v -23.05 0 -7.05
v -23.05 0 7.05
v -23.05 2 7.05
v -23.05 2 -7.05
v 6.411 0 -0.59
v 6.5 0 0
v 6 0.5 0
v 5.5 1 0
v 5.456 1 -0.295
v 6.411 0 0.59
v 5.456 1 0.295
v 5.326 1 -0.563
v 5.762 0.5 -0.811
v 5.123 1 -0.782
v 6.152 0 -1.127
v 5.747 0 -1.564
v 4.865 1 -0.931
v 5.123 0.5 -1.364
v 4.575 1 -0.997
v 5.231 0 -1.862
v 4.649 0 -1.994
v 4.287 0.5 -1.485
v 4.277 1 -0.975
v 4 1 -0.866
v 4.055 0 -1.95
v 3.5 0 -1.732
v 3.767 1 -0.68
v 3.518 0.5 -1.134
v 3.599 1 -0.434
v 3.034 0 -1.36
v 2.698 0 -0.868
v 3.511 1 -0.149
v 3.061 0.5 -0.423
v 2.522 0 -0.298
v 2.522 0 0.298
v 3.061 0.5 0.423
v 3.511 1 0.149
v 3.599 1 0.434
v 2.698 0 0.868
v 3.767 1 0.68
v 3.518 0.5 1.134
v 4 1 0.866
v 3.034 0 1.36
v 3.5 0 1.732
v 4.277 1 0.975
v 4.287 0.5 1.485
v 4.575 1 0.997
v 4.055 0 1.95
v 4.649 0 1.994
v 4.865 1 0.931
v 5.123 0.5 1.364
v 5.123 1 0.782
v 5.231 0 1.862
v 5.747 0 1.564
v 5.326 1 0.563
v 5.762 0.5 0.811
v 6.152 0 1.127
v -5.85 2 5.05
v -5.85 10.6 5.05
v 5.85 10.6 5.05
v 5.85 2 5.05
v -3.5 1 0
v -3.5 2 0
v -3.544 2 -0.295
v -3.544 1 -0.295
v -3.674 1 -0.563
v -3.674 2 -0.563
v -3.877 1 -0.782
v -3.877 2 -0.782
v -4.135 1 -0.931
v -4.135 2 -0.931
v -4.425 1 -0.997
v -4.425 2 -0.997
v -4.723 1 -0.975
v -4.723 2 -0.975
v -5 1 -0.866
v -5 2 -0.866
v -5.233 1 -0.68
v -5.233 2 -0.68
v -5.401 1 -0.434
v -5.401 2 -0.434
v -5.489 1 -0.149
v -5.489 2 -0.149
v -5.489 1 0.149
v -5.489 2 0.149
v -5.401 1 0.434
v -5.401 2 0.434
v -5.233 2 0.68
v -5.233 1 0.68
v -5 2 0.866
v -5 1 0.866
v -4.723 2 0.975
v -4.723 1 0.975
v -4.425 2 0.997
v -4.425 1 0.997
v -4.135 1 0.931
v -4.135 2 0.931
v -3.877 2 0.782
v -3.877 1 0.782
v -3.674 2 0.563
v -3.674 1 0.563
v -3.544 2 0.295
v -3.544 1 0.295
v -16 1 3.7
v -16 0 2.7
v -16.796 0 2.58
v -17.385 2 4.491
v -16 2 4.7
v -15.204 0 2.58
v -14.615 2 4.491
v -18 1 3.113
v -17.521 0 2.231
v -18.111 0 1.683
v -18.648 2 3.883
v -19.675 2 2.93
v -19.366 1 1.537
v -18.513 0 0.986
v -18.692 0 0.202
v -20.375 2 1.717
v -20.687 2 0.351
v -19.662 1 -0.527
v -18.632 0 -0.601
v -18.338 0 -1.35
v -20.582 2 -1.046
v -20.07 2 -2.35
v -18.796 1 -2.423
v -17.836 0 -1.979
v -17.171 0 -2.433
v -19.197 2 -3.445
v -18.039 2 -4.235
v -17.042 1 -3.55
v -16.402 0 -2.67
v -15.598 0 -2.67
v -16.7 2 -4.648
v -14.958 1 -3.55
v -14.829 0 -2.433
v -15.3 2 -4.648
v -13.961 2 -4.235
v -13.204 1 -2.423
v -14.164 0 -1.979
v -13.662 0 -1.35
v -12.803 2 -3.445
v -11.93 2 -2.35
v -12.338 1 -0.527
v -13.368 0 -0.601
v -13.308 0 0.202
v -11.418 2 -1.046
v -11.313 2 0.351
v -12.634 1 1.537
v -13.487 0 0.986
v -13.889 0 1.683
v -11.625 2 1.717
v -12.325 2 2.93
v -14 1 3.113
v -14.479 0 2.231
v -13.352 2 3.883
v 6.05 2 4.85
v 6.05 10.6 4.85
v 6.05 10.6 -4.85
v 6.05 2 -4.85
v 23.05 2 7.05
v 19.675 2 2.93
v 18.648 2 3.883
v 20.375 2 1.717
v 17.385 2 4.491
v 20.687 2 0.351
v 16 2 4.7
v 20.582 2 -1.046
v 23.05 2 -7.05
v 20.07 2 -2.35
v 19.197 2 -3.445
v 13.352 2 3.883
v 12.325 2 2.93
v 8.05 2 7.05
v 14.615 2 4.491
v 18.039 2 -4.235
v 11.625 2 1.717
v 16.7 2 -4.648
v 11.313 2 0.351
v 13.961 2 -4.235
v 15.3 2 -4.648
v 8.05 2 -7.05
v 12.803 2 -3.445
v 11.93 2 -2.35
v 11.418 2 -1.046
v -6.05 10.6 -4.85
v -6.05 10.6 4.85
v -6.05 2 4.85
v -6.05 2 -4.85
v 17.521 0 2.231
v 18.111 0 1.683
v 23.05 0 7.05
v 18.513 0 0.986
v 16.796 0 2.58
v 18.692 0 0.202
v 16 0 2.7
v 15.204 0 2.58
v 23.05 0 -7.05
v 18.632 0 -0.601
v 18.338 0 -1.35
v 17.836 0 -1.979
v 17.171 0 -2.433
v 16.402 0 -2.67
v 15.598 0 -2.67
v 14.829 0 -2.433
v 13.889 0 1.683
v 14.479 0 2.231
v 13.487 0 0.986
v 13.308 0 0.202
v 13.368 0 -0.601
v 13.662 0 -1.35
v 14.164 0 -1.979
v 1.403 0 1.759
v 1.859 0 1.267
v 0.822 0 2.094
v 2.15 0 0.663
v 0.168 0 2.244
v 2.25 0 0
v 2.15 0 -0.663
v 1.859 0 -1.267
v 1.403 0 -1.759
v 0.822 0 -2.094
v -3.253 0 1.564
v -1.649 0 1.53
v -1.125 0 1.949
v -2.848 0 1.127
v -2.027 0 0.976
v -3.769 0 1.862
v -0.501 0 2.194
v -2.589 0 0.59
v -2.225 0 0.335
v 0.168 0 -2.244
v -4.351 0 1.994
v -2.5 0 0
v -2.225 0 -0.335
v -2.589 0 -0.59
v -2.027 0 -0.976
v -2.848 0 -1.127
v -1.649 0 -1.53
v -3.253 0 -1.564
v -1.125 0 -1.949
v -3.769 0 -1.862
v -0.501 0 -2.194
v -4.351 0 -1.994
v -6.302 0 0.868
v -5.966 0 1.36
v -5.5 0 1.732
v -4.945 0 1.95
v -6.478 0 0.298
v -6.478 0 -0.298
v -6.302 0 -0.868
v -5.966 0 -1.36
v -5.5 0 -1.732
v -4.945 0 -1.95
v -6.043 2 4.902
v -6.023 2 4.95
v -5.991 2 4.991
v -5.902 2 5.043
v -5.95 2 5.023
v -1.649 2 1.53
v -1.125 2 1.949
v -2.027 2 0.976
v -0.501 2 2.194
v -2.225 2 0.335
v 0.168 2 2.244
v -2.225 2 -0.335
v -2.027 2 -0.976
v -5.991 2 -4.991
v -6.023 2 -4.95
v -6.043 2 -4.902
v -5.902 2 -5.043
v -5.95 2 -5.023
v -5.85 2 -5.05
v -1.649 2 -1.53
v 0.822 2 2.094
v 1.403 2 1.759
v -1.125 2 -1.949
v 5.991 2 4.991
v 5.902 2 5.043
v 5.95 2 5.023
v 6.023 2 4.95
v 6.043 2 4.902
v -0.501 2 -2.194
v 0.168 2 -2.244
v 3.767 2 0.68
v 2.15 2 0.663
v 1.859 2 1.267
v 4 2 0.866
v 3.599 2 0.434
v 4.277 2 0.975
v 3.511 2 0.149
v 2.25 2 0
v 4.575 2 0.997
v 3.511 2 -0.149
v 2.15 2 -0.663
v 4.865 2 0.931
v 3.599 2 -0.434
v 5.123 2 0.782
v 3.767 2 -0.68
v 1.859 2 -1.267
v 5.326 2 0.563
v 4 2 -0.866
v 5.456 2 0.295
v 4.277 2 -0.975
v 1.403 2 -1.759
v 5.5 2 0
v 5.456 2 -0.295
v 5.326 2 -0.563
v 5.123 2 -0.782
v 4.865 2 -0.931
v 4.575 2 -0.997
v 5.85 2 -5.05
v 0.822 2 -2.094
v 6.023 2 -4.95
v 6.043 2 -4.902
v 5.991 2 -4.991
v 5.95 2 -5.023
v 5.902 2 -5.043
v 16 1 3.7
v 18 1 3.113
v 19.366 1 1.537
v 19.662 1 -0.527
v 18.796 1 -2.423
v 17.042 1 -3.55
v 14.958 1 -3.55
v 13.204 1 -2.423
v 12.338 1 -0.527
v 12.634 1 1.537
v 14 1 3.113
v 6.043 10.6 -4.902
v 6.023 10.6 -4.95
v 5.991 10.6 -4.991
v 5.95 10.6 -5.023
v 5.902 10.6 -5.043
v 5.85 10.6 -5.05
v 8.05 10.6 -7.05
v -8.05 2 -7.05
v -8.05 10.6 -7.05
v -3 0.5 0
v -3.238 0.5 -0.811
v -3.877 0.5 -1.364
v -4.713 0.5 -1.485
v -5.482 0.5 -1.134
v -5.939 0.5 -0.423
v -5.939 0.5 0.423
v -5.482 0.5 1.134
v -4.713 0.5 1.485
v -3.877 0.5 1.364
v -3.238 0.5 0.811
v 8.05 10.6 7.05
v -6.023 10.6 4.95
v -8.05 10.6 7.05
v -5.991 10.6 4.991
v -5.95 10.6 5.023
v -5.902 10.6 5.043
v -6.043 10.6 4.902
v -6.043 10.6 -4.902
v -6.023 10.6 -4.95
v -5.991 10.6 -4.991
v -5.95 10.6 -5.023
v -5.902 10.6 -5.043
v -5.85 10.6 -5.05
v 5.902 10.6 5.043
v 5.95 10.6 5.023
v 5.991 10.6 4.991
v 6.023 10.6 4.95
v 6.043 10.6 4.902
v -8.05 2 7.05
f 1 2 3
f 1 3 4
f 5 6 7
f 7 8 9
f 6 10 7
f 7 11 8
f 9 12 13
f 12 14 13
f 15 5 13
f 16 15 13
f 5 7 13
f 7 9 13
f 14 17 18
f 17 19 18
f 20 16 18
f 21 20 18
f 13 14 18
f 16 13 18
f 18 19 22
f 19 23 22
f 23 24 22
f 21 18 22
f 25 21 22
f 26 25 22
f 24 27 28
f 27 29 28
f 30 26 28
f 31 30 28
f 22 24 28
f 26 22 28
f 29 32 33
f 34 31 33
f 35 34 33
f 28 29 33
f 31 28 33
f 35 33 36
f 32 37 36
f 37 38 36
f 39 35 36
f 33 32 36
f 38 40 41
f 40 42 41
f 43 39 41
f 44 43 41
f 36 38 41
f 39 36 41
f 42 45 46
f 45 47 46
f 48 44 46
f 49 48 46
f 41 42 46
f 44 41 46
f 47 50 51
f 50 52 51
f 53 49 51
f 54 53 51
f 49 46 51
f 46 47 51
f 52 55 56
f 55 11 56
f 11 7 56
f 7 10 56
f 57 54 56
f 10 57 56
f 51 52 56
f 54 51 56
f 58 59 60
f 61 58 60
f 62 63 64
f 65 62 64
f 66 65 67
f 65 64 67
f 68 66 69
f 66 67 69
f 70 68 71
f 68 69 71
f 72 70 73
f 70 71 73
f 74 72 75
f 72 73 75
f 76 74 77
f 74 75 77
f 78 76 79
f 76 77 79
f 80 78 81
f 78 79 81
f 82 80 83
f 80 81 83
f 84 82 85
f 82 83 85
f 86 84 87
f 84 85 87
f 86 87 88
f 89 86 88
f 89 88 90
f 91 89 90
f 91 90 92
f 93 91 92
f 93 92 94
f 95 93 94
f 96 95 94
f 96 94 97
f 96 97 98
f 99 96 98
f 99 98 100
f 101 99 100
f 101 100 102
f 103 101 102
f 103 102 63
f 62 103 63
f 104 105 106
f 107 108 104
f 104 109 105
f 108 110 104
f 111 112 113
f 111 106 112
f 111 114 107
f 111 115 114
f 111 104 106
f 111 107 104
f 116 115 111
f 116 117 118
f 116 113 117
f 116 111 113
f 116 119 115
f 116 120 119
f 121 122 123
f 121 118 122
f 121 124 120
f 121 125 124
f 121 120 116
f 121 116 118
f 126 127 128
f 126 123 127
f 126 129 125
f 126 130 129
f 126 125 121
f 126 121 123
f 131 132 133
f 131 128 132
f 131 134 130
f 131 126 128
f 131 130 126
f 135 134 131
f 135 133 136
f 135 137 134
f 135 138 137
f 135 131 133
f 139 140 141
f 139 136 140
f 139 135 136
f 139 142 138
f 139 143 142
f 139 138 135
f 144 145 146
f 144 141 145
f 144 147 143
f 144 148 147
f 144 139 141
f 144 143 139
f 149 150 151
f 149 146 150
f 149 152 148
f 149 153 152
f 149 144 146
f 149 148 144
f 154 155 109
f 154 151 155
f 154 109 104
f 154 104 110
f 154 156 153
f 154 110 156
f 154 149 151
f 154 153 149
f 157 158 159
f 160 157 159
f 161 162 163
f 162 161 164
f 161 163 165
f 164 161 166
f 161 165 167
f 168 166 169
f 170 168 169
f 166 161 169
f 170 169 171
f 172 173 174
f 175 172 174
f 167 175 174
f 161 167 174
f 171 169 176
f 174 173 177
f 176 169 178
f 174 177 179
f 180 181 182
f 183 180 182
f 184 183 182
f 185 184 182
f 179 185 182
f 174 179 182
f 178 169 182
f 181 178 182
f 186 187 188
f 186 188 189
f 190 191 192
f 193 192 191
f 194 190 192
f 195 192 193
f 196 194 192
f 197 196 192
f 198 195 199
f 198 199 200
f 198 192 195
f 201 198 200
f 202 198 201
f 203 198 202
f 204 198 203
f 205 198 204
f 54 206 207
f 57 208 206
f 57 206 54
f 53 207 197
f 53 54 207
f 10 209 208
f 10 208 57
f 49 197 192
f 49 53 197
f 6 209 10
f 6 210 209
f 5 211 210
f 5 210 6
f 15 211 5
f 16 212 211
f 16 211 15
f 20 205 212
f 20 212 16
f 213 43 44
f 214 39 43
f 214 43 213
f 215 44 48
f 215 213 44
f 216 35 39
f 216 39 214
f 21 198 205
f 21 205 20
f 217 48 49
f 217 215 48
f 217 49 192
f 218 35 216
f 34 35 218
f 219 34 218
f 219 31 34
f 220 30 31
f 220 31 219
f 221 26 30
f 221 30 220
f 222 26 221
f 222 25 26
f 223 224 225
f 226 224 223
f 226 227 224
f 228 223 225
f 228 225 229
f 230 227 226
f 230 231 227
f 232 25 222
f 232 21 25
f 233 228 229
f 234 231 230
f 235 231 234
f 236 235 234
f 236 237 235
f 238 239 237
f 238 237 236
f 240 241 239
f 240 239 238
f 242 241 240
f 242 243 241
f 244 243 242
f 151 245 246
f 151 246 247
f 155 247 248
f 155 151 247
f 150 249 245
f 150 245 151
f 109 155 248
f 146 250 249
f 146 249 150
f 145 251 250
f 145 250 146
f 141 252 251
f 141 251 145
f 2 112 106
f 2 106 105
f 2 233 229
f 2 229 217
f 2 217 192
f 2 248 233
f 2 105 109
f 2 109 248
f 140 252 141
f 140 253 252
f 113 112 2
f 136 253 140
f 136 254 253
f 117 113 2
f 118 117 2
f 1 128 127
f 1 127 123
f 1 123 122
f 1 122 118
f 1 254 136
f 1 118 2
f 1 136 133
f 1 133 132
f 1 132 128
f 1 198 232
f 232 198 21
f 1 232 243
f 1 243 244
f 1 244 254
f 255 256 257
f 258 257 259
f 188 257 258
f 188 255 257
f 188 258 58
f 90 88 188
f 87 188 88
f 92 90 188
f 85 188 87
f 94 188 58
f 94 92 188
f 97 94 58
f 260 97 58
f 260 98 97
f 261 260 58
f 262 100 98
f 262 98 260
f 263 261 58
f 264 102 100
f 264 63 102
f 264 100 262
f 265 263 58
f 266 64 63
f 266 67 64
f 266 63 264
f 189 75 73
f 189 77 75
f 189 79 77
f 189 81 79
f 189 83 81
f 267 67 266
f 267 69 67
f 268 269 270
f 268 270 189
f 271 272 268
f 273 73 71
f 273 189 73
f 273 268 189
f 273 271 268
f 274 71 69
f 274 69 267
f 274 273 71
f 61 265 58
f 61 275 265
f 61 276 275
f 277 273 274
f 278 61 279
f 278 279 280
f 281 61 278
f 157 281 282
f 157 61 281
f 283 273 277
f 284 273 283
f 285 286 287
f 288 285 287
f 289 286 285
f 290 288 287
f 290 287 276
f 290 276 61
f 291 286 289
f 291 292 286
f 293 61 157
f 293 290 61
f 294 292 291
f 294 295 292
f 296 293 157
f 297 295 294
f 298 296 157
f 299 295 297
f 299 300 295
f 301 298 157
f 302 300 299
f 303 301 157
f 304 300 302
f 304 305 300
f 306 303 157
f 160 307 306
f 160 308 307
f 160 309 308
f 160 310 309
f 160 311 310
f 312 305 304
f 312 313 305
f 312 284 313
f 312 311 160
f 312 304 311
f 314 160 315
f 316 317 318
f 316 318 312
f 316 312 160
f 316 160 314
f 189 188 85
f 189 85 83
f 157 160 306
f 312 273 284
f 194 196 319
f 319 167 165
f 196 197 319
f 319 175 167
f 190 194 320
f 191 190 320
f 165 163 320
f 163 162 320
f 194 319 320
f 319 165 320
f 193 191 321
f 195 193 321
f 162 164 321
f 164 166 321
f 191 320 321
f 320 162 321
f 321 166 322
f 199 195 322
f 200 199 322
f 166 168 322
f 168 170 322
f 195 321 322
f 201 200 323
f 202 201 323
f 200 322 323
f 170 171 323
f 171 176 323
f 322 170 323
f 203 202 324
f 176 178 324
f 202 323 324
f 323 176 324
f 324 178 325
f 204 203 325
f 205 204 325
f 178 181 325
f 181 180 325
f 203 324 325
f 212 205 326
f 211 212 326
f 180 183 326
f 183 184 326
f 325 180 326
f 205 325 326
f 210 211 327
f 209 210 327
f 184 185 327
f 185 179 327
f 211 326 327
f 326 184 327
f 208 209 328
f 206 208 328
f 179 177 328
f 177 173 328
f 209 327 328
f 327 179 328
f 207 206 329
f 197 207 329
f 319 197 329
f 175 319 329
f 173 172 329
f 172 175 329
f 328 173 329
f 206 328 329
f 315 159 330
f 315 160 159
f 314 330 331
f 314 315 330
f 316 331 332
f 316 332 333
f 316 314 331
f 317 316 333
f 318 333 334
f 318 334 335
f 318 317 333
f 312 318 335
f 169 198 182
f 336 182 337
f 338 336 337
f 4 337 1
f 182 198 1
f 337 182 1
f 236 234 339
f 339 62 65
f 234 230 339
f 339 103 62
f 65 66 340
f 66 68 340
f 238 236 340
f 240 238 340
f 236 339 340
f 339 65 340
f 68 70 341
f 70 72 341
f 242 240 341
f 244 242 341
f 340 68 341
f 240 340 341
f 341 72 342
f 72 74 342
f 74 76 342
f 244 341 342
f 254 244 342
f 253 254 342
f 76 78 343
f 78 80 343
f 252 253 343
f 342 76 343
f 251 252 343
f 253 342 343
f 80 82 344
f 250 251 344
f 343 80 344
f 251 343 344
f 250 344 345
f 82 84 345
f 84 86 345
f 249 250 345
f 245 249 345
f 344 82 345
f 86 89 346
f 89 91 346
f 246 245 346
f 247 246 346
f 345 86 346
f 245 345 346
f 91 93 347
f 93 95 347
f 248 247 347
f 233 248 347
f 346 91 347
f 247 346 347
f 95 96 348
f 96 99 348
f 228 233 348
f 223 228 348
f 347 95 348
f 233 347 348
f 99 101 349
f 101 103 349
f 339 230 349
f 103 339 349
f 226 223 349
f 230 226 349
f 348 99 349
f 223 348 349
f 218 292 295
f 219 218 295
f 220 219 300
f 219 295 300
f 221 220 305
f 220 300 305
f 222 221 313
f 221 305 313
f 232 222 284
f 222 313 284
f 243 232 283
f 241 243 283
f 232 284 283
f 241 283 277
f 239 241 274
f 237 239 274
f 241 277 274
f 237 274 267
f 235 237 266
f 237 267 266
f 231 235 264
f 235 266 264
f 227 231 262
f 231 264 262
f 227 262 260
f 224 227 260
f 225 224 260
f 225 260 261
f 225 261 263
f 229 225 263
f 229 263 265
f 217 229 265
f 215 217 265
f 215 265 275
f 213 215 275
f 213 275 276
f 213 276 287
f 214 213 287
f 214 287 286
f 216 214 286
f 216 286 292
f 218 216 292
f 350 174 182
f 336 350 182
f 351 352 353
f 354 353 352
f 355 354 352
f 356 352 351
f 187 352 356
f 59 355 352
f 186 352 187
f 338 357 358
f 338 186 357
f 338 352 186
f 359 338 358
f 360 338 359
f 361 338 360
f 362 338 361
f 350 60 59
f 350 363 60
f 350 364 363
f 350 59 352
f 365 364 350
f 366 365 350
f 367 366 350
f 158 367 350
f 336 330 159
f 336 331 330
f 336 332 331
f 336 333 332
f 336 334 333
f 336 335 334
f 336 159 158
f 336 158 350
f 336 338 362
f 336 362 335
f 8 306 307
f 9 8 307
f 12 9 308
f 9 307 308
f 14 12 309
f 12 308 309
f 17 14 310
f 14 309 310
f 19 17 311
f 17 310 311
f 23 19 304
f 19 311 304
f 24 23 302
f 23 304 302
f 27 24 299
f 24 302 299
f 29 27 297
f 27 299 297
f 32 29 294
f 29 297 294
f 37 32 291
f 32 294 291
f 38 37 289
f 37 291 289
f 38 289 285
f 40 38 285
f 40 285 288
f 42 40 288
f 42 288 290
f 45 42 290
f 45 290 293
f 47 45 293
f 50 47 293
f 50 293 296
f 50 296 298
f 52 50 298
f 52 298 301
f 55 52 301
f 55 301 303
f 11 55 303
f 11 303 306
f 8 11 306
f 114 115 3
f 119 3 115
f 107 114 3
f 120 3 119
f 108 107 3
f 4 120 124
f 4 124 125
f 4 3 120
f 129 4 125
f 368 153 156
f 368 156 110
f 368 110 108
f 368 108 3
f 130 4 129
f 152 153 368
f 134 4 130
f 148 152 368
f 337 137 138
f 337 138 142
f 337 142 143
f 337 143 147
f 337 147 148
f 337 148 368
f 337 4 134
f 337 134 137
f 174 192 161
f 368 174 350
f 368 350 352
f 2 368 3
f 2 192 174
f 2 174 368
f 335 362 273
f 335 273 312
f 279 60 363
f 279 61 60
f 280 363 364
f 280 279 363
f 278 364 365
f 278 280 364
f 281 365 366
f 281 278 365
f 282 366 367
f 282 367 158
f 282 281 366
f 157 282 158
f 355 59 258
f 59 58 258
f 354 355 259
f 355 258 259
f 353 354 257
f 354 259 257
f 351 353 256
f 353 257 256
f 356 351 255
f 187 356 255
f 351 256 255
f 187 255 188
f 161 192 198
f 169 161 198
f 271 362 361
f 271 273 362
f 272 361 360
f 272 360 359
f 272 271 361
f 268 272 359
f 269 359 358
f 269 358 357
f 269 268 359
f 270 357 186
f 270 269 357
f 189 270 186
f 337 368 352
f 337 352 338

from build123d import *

# Parameters (mm, degrees)
SKETCH1_W                                            = 16.1
SKETCH1_H                                            = 14.1
BOSS_EXTRUDE1_DEPTH                                  = 10.6
SKETCH3_W                                            = 12.1
SKETCH3_H                                            = 10.1
CUT_EXTRUDE1_DEPTH                                   = 8.6
CSK_FOR_M1_6_COUNTERSUNK_FLAT_HEAD_SCREW_D           = 2
CSK_FOR_M1_6_COUNTERSUNK_FLAT_HEAD_SCREW_DEPTH       = 2
CSK_FOR_M1_6_COUNTERSUNK_FLAT_HEAD_SCREW_CSINK_D     = 4
CSK_FOR_M1_6_COUNTERSUNK_FLAT_HEAD_SCREW_CSINK_ANGLE = 90
SKETCH8_R                                            = 2.25
CUT_EXTRUDE2_DEPTH                                   = 3
FILLET2_R                                            = 0.2
SKETCH9_W                                            = 15
SKETCH9_H                                            = 14.1
BOSS_EXTRUDE2_DEPTH                                  = 2


with BuildPart() as part:
    # Sketch1 → Boss-Extrude1 (new body)
    with BuildSketch(Plane(origin=(0, 0, 0), x_dir=(1, 0, 0), z_dir=(0, 1, 0))):
        Rectangle(SKETCH1_W, SKETCH1_H)
    extrude(amount=BOSS_EXTRUDE1_DEPTH)

    # Sketch3 → Cut-Extrude1 (cut)
    with BuildSketch(Plane(origin=(0, 10.6, 0), x_dir=(1, 0, 0), z_dir=(0, 1, 0))):
        Rectangle(SKETCH3_W, SKETCH3_H)
    extrude(amount=-CUT_EXTRUDE1_DEPTH, mode=Mode.SUBTRACT)

    # CSK for M1.6 Countersunk Flat Head Screw1
    with Locations(Plane(origin=(0, 0, 0), x_dir=(-1, 0, 0), z_dir=(0, -1, 0))):
        with Locations((4.5, 0), (-4.5, 0)):
            CounterSinkHole(CSK_FOR_M1_6_COUNTERSUNK_FLAT_HEAD_SCREW_D / 2, CSK_FOR_M1_6_COUNTERSUNK_FLAT_HEAD_SCREW_CSINK_D / 2, depth=CSK_FOR_M1_6_COUNTERSUNK_FLAT_HEAD_SCREW_DEPTH, counter_sink_angle=CSK_FOR_M1_6_COUNTERSUNK_FLAT_HEAD_SCREW_CSINK_ANGLE)

    # Sketch8 → Cut-Extrude2 (cut, through all)
    with BuildSketch(Plane(origin=(0, 2, 0), x_dir=(1, 0, 0), z_dir=(0, 1, 0))):
        Circle(SKETCH8_R)
    extrude(amount=-CUT_EXTRUDE2_DEPTH, mode=Mode.SUBTRACT)

    # Fillet2
    fillet2_edges = [part.edges().sort_by_distance(p)[0] for p in [
        (-6.05, 6.3, 5.05),
        (-6.05, 6.3, -5.05),
        (6.05, 6.3, -5.05),
        (6.05, 6.3, 5.05),
    ]]
    fillet(fillet2_edges, radius=FILLET2_R)

    # Sketch9 → Boss-Extrude2 (add)
    with BuildSketch(Plane(origin=(0, 0, 0), x_dir=(1, 0, 0), z_dir=(0, 1, 0))):
        with Locations((-15.55, 0)):
            Rectangle(SKETCH9_W, SKETCH9_H)
    boss_extrude2 = extrude(amount=BOSS_EXTRUDE2_DEPTH)

    # Sketch11 → CSK for M4 Countersunk Flat Head Screw1 (revolve, cut)
    with BuildSketch(Plane(origin=(-16, 2, 0), x_dir=(0, 0, 1), z_dir=(1, 0, 0))):
        Polygon((0, 0), (0, 2.001), (2.4, 2.001), (2.4, 2.3), (4.7, 0), align=None)
    csk_for_m4_countersunk_flat_head_screw1 = revolve(axis=Axis((-16, 8.35, 0), (0, -1, 0)), mode=Mode.SUBTRACT)

    # Mirror1: Boss-Extrude2, CSK for M4 Countersunk Flat Head Screw1 across plane
    add(boss_extrude2.mirror(Plane(origin=(0, 0, 0), x_dir=(0, 0, 1), z_dir=(1, 0, 0))))
    add(csk_for_m4_countersunk_flat_head_screw1.mirror(Plane(origin=(0, 0, 0), x_dir=(0, 0, 1), z_dir=(1, 0, 0))), mode=Mode.SUBTRACT)


solid = part.part
